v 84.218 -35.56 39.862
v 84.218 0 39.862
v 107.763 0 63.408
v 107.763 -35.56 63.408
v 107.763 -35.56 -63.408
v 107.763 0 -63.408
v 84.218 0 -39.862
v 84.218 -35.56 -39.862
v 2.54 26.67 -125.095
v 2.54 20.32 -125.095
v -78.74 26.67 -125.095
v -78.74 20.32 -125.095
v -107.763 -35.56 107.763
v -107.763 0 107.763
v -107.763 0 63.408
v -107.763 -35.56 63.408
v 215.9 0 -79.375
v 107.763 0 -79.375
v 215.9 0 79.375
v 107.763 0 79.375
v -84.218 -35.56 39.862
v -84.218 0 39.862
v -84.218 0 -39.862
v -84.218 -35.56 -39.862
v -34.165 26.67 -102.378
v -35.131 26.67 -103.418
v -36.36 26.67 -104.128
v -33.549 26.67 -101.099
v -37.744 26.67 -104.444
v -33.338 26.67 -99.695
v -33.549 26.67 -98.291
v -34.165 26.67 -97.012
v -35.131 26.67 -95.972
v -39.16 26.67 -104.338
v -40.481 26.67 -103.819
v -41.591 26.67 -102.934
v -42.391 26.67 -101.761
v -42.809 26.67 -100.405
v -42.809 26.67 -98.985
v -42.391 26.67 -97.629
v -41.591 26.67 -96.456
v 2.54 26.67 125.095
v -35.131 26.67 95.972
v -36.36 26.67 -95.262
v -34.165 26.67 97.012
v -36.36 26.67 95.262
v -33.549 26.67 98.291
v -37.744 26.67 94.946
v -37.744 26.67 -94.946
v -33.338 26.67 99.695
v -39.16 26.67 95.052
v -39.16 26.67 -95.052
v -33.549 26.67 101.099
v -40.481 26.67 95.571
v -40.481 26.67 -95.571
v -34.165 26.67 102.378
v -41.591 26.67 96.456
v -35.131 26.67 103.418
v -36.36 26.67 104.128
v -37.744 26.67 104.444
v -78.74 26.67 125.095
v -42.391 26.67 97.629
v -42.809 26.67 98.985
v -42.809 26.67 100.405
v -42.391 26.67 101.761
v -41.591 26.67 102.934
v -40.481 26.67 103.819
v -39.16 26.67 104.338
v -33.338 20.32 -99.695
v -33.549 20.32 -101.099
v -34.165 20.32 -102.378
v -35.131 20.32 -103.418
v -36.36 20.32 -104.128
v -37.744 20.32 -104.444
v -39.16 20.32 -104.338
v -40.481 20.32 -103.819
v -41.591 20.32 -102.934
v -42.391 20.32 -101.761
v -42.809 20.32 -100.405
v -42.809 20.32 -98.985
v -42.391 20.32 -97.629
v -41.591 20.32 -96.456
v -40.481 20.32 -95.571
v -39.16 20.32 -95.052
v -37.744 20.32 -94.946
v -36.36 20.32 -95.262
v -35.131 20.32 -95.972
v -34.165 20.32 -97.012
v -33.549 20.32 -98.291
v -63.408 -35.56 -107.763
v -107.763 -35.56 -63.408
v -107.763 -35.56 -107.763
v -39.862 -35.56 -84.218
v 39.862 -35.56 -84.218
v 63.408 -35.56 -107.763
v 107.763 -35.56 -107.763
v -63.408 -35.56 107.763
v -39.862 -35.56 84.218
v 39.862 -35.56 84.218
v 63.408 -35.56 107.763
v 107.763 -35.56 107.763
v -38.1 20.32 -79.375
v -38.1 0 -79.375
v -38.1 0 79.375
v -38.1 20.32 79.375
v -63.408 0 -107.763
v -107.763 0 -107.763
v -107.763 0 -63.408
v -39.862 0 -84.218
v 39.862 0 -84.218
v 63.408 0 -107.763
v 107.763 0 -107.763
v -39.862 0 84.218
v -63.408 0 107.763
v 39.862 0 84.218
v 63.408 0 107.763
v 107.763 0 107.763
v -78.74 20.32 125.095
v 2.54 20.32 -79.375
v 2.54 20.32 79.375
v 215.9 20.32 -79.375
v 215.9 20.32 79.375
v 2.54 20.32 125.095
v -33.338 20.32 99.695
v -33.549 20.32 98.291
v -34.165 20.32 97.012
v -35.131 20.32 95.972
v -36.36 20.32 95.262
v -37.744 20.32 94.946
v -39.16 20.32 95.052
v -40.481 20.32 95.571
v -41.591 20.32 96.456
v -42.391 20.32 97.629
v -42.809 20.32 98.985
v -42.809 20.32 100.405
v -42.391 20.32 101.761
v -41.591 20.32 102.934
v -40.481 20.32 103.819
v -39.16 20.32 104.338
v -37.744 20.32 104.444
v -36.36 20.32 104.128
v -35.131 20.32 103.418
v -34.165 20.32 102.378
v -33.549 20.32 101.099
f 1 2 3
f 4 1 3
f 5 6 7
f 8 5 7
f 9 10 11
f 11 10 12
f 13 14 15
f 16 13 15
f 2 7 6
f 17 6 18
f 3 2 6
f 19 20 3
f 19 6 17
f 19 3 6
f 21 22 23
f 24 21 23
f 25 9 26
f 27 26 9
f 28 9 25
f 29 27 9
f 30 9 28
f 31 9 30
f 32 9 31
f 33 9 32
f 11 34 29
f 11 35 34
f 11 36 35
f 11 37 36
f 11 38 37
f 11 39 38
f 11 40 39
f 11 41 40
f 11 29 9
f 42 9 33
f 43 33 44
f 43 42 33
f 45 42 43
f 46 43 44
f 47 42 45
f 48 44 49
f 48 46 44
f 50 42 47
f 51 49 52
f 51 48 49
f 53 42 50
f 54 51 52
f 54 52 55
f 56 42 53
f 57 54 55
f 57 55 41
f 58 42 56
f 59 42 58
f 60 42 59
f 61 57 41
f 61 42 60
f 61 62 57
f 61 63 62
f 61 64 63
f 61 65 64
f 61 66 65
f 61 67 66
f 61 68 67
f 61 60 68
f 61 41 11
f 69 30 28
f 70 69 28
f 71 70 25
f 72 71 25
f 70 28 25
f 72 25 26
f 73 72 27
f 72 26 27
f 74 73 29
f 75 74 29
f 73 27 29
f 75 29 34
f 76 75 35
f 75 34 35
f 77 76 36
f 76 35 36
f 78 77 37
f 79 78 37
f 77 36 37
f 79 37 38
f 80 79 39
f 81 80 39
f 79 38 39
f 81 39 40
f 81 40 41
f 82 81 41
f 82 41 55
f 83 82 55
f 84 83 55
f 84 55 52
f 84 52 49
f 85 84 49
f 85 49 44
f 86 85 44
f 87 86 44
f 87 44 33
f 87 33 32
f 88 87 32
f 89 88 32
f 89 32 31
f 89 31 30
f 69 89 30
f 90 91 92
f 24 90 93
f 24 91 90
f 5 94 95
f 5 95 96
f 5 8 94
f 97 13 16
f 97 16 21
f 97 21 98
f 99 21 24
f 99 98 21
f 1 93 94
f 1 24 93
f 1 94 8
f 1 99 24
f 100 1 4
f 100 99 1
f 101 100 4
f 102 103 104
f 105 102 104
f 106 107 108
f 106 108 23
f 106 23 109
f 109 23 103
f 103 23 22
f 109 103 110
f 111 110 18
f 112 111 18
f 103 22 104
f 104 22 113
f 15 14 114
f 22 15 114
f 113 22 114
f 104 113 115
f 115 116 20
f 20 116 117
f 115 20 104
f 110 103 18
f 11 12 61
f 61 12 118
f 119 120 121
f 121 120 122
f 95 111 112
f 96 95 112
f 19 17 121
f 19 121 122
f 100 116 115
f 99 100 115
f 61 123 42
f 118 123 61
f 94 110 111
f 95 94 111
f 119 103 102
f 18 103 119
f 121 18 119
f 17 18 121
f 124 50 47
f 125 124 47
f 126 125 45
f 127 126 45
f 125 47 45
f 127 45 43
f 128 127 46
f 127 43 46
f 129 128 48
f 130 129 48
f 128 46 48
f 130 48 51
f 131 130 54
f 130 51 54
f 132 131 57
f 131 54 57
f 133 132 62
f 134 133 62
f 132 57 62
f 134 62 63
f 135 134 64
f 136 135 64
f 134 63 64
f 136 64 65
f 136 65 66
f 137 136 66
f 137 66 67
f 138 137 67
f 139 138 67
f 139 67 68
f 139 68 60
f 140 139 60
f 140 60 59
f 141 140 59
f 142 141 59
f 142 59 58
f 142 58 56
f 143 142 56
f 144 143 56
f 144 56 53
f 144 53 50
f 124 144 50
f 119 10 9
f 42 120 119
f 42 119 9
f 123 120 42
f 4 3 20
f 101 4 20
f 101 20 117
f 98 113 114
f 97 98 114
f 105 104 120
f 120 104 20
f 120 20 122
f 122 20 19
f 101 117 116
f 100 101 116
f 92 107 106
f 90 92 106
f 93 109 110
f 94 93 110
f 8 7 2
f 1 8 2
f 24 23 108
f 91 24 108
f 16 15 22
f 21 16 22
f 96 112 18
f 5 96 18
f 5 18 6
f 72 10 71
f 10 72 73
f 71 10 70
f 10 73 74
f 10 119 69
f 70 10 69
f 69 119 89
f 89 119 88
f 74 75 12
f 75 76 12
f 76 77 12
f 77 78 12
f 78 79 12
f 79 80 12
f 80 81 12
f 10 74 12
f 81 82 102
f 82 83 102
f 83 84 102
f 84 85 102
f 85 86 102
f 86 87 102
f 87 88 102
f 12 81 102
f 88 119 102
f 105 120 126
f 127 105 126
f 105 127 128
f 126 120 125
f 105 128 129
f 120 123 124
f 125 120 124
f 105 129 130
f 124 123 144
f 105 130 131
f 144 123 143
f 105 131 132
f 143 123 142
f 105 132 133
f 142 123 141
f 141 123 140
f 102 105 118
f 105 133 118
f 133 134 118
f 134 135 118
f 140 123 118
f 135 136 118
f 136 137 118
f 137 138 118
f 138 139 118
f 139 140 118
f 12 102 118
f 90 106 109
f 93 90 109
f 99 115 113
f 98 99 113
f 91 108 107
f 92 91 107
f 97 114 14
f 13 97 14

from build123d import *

# Parameters (mm, degrees)
F1_DEPTH = 35.56
F2_W     = 254
F2_H     = 158.75
F3_DEPTH = 20.32
F4_W     = 81.28
F4_H     = 250.19
F5_DEPTH = 6.35
F6_D     = 9.525


with BuildPart() as f1:
    # F0 (on Front) → F1 (new body)
    with BuildSketch(Plane.XZ):
        Polygon((107.763073, 63.407903), (107.763073, 107.763073), (63.407903, 107.763073), (39.86235, 84.21752), (0, 84.21752), (-39.86235, 84.21752), (-63.407903, 107.763073), (-107.763073, 107.763073), (-107.763073, 63.407903), (-84.21752, 39.86235), (-84.21752, 0), (-84.21752, -39.86235), (-107.763073, -63.407903), (-107.763073, -107.763073), (-63.407903, -107.763073), (-39.86235, -84.21752), (0, -84.21752), (39.86235, -84.21752), (63.407903, -107.763073), (107.763073, -107.763073), (107.763073, -63.407903), (84.21752, -39.86235), (84.21752, 0), (84.21752, 39.86235), align=None)
    extrude(amount=F1_DEPTH)

    # F2 (on Front) → F3 (join)
    with BuildSketch(Plane.XZ):
        with Locations((88.9, 0)):
            Rectangle(F2_W, F2_H)
    extrude(amount=-F3_DEPTH)

    # F4 (on face) → F5 (join)
    with BuildSketch(Plane(origin=(0, 20.32, 0), x_dir=(-1, 0, 0), z_dir=(0, 1, 0))):
        with Locations((38.1, 0)):
            Rectangle(F4_W, F4_H)
    extrude(amount=F5_DEPTH)

    # F6 (through all)
    with Locations(Plane(origin=(0, 20.32, 0), x_dir=(-1, 0, 0), z_dir=(0, -1, 0))):
        with Locations((38.1, 99.695), (38.1, -99.695)):
            Hole(F6_D / 2)


solid = f1.part
